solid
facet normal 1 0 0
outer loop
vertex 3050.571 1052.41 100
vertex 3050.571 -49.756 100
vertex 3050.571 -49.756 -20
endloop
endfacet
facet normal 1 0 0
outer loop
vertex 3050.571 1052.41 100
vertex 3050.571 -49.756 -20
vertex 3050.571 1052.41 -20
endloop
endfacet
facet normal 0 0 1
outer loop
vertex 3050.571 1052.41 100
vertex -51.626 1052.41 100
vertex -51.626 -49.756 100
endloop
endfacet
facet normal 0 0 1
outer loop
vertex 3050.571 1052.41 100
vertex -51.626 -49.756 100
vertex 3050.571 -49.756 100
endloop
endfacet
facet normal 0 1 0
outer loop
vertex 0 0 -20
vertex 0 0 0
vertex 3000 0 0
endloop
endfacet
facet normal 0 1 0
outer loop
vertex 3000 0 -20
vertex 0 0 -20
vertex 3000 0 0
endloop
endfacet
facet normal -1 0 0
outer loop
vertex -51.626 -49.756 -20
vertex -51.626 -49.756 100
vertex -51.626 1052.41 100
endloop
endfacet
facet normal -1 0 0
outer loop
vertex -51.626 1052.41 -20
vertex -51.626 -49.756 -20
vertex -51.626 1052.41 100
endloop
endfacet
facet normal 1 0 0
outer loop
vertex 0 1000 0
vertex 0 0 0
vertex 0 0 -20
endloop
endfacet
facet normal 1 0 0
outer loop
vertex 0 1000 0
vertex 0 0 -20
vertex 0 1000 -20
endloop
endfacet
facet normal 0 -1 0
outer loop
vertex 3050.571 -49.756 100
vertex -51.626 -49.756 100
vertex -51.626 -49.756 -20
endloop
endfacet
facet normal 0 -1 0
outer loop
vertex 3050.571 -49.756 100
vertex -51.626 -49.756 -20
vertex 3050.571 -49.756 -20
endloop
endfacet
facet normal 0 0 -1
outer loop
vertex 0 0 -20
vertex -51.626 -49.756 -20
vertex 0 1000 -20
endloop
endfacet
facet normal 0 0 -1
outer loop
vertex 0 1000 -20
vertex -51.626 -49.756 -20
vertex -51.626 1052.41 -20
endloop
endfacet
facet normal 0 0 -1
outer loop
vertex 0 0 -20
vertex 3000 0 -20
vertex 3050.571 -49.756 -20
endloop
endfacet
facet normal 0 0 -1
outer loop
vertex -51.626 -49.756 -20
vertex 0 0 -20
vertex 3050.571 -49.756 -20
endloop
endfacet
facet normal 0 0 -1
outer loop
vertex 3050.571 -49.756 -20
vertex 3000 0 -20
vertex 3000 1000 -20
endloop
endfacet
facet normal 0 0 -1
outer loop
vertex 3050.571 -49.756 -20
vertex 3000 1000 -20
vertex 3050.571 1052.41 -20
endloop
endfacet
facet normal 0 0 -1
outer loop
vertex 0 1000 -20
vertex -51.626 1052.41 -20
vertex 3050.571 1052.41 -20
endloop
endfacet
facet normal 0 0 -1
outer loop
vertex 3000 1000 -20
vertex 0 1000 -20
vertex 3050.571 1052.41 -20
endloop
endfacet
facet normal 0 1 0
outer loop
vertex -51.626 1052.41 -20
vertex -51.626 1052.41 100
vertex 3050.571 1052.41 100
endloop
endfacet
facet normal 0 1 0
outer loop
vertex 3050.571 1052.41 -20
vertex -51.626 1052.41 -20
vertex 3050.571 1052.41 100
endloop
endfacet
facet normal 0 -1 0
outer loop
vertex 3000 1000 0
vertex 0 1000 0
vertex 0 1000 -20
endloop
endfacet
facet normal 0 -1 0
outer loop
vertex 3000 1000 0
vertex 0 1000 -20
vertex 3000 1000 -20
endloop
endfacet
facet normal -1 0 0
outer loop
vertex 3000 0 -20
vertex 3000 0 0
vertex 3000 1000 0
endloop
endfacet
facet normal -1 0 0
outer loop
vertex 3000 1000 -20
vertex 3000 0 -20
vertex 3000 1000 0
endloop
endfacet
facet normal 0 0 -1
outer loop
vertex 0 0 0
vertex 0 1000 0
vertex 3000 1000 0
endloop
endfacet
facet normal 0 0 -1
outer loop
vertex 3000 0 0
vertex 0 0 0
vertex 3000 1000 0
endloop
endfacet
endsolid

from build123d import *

# Parameters (mm, degrees)
SKETCH_1_W      = 3000
SKETCH_1_H      = 1000
EXTRUDE_2_DEPTH = 100
SKETCH_3_W      = 3102.196453332
SKETCH_3_H      = 1102.16581061
SKETCH_3_W_2    = 3000
SKETCH_3_H_2    = 1000
EXTRUDE_3_DEPTH = 120


with BuildPart() as part:
    # 草图1 → 凸台-拉伸2 (new body)
    with BuildSketch(Plane.XY):
        with Locations((1500, 500)):
            Rectangle(SKETCH_1_W, SKETCH_1_H)
    extrude(amount=EXTRUDE_2_DEPTH)

    # 草图3 → 凸台-拉伸3 (add)
    with BuildSketch(Plane.XY.offset(100)):
        with Locations((1499.472456501, 501.327082248)):
            Rectangle(SKETCH_3_W, SKETCH_3_H)
        with Locations((1500, 500)):
            Rectangle(SKETCH_3_W_2, SKETCH_3_H_2, mode=Mode.SUBTRACT)
    extrude(amount=-EXTRUDE_3_DEPTH)


solid = part.part
